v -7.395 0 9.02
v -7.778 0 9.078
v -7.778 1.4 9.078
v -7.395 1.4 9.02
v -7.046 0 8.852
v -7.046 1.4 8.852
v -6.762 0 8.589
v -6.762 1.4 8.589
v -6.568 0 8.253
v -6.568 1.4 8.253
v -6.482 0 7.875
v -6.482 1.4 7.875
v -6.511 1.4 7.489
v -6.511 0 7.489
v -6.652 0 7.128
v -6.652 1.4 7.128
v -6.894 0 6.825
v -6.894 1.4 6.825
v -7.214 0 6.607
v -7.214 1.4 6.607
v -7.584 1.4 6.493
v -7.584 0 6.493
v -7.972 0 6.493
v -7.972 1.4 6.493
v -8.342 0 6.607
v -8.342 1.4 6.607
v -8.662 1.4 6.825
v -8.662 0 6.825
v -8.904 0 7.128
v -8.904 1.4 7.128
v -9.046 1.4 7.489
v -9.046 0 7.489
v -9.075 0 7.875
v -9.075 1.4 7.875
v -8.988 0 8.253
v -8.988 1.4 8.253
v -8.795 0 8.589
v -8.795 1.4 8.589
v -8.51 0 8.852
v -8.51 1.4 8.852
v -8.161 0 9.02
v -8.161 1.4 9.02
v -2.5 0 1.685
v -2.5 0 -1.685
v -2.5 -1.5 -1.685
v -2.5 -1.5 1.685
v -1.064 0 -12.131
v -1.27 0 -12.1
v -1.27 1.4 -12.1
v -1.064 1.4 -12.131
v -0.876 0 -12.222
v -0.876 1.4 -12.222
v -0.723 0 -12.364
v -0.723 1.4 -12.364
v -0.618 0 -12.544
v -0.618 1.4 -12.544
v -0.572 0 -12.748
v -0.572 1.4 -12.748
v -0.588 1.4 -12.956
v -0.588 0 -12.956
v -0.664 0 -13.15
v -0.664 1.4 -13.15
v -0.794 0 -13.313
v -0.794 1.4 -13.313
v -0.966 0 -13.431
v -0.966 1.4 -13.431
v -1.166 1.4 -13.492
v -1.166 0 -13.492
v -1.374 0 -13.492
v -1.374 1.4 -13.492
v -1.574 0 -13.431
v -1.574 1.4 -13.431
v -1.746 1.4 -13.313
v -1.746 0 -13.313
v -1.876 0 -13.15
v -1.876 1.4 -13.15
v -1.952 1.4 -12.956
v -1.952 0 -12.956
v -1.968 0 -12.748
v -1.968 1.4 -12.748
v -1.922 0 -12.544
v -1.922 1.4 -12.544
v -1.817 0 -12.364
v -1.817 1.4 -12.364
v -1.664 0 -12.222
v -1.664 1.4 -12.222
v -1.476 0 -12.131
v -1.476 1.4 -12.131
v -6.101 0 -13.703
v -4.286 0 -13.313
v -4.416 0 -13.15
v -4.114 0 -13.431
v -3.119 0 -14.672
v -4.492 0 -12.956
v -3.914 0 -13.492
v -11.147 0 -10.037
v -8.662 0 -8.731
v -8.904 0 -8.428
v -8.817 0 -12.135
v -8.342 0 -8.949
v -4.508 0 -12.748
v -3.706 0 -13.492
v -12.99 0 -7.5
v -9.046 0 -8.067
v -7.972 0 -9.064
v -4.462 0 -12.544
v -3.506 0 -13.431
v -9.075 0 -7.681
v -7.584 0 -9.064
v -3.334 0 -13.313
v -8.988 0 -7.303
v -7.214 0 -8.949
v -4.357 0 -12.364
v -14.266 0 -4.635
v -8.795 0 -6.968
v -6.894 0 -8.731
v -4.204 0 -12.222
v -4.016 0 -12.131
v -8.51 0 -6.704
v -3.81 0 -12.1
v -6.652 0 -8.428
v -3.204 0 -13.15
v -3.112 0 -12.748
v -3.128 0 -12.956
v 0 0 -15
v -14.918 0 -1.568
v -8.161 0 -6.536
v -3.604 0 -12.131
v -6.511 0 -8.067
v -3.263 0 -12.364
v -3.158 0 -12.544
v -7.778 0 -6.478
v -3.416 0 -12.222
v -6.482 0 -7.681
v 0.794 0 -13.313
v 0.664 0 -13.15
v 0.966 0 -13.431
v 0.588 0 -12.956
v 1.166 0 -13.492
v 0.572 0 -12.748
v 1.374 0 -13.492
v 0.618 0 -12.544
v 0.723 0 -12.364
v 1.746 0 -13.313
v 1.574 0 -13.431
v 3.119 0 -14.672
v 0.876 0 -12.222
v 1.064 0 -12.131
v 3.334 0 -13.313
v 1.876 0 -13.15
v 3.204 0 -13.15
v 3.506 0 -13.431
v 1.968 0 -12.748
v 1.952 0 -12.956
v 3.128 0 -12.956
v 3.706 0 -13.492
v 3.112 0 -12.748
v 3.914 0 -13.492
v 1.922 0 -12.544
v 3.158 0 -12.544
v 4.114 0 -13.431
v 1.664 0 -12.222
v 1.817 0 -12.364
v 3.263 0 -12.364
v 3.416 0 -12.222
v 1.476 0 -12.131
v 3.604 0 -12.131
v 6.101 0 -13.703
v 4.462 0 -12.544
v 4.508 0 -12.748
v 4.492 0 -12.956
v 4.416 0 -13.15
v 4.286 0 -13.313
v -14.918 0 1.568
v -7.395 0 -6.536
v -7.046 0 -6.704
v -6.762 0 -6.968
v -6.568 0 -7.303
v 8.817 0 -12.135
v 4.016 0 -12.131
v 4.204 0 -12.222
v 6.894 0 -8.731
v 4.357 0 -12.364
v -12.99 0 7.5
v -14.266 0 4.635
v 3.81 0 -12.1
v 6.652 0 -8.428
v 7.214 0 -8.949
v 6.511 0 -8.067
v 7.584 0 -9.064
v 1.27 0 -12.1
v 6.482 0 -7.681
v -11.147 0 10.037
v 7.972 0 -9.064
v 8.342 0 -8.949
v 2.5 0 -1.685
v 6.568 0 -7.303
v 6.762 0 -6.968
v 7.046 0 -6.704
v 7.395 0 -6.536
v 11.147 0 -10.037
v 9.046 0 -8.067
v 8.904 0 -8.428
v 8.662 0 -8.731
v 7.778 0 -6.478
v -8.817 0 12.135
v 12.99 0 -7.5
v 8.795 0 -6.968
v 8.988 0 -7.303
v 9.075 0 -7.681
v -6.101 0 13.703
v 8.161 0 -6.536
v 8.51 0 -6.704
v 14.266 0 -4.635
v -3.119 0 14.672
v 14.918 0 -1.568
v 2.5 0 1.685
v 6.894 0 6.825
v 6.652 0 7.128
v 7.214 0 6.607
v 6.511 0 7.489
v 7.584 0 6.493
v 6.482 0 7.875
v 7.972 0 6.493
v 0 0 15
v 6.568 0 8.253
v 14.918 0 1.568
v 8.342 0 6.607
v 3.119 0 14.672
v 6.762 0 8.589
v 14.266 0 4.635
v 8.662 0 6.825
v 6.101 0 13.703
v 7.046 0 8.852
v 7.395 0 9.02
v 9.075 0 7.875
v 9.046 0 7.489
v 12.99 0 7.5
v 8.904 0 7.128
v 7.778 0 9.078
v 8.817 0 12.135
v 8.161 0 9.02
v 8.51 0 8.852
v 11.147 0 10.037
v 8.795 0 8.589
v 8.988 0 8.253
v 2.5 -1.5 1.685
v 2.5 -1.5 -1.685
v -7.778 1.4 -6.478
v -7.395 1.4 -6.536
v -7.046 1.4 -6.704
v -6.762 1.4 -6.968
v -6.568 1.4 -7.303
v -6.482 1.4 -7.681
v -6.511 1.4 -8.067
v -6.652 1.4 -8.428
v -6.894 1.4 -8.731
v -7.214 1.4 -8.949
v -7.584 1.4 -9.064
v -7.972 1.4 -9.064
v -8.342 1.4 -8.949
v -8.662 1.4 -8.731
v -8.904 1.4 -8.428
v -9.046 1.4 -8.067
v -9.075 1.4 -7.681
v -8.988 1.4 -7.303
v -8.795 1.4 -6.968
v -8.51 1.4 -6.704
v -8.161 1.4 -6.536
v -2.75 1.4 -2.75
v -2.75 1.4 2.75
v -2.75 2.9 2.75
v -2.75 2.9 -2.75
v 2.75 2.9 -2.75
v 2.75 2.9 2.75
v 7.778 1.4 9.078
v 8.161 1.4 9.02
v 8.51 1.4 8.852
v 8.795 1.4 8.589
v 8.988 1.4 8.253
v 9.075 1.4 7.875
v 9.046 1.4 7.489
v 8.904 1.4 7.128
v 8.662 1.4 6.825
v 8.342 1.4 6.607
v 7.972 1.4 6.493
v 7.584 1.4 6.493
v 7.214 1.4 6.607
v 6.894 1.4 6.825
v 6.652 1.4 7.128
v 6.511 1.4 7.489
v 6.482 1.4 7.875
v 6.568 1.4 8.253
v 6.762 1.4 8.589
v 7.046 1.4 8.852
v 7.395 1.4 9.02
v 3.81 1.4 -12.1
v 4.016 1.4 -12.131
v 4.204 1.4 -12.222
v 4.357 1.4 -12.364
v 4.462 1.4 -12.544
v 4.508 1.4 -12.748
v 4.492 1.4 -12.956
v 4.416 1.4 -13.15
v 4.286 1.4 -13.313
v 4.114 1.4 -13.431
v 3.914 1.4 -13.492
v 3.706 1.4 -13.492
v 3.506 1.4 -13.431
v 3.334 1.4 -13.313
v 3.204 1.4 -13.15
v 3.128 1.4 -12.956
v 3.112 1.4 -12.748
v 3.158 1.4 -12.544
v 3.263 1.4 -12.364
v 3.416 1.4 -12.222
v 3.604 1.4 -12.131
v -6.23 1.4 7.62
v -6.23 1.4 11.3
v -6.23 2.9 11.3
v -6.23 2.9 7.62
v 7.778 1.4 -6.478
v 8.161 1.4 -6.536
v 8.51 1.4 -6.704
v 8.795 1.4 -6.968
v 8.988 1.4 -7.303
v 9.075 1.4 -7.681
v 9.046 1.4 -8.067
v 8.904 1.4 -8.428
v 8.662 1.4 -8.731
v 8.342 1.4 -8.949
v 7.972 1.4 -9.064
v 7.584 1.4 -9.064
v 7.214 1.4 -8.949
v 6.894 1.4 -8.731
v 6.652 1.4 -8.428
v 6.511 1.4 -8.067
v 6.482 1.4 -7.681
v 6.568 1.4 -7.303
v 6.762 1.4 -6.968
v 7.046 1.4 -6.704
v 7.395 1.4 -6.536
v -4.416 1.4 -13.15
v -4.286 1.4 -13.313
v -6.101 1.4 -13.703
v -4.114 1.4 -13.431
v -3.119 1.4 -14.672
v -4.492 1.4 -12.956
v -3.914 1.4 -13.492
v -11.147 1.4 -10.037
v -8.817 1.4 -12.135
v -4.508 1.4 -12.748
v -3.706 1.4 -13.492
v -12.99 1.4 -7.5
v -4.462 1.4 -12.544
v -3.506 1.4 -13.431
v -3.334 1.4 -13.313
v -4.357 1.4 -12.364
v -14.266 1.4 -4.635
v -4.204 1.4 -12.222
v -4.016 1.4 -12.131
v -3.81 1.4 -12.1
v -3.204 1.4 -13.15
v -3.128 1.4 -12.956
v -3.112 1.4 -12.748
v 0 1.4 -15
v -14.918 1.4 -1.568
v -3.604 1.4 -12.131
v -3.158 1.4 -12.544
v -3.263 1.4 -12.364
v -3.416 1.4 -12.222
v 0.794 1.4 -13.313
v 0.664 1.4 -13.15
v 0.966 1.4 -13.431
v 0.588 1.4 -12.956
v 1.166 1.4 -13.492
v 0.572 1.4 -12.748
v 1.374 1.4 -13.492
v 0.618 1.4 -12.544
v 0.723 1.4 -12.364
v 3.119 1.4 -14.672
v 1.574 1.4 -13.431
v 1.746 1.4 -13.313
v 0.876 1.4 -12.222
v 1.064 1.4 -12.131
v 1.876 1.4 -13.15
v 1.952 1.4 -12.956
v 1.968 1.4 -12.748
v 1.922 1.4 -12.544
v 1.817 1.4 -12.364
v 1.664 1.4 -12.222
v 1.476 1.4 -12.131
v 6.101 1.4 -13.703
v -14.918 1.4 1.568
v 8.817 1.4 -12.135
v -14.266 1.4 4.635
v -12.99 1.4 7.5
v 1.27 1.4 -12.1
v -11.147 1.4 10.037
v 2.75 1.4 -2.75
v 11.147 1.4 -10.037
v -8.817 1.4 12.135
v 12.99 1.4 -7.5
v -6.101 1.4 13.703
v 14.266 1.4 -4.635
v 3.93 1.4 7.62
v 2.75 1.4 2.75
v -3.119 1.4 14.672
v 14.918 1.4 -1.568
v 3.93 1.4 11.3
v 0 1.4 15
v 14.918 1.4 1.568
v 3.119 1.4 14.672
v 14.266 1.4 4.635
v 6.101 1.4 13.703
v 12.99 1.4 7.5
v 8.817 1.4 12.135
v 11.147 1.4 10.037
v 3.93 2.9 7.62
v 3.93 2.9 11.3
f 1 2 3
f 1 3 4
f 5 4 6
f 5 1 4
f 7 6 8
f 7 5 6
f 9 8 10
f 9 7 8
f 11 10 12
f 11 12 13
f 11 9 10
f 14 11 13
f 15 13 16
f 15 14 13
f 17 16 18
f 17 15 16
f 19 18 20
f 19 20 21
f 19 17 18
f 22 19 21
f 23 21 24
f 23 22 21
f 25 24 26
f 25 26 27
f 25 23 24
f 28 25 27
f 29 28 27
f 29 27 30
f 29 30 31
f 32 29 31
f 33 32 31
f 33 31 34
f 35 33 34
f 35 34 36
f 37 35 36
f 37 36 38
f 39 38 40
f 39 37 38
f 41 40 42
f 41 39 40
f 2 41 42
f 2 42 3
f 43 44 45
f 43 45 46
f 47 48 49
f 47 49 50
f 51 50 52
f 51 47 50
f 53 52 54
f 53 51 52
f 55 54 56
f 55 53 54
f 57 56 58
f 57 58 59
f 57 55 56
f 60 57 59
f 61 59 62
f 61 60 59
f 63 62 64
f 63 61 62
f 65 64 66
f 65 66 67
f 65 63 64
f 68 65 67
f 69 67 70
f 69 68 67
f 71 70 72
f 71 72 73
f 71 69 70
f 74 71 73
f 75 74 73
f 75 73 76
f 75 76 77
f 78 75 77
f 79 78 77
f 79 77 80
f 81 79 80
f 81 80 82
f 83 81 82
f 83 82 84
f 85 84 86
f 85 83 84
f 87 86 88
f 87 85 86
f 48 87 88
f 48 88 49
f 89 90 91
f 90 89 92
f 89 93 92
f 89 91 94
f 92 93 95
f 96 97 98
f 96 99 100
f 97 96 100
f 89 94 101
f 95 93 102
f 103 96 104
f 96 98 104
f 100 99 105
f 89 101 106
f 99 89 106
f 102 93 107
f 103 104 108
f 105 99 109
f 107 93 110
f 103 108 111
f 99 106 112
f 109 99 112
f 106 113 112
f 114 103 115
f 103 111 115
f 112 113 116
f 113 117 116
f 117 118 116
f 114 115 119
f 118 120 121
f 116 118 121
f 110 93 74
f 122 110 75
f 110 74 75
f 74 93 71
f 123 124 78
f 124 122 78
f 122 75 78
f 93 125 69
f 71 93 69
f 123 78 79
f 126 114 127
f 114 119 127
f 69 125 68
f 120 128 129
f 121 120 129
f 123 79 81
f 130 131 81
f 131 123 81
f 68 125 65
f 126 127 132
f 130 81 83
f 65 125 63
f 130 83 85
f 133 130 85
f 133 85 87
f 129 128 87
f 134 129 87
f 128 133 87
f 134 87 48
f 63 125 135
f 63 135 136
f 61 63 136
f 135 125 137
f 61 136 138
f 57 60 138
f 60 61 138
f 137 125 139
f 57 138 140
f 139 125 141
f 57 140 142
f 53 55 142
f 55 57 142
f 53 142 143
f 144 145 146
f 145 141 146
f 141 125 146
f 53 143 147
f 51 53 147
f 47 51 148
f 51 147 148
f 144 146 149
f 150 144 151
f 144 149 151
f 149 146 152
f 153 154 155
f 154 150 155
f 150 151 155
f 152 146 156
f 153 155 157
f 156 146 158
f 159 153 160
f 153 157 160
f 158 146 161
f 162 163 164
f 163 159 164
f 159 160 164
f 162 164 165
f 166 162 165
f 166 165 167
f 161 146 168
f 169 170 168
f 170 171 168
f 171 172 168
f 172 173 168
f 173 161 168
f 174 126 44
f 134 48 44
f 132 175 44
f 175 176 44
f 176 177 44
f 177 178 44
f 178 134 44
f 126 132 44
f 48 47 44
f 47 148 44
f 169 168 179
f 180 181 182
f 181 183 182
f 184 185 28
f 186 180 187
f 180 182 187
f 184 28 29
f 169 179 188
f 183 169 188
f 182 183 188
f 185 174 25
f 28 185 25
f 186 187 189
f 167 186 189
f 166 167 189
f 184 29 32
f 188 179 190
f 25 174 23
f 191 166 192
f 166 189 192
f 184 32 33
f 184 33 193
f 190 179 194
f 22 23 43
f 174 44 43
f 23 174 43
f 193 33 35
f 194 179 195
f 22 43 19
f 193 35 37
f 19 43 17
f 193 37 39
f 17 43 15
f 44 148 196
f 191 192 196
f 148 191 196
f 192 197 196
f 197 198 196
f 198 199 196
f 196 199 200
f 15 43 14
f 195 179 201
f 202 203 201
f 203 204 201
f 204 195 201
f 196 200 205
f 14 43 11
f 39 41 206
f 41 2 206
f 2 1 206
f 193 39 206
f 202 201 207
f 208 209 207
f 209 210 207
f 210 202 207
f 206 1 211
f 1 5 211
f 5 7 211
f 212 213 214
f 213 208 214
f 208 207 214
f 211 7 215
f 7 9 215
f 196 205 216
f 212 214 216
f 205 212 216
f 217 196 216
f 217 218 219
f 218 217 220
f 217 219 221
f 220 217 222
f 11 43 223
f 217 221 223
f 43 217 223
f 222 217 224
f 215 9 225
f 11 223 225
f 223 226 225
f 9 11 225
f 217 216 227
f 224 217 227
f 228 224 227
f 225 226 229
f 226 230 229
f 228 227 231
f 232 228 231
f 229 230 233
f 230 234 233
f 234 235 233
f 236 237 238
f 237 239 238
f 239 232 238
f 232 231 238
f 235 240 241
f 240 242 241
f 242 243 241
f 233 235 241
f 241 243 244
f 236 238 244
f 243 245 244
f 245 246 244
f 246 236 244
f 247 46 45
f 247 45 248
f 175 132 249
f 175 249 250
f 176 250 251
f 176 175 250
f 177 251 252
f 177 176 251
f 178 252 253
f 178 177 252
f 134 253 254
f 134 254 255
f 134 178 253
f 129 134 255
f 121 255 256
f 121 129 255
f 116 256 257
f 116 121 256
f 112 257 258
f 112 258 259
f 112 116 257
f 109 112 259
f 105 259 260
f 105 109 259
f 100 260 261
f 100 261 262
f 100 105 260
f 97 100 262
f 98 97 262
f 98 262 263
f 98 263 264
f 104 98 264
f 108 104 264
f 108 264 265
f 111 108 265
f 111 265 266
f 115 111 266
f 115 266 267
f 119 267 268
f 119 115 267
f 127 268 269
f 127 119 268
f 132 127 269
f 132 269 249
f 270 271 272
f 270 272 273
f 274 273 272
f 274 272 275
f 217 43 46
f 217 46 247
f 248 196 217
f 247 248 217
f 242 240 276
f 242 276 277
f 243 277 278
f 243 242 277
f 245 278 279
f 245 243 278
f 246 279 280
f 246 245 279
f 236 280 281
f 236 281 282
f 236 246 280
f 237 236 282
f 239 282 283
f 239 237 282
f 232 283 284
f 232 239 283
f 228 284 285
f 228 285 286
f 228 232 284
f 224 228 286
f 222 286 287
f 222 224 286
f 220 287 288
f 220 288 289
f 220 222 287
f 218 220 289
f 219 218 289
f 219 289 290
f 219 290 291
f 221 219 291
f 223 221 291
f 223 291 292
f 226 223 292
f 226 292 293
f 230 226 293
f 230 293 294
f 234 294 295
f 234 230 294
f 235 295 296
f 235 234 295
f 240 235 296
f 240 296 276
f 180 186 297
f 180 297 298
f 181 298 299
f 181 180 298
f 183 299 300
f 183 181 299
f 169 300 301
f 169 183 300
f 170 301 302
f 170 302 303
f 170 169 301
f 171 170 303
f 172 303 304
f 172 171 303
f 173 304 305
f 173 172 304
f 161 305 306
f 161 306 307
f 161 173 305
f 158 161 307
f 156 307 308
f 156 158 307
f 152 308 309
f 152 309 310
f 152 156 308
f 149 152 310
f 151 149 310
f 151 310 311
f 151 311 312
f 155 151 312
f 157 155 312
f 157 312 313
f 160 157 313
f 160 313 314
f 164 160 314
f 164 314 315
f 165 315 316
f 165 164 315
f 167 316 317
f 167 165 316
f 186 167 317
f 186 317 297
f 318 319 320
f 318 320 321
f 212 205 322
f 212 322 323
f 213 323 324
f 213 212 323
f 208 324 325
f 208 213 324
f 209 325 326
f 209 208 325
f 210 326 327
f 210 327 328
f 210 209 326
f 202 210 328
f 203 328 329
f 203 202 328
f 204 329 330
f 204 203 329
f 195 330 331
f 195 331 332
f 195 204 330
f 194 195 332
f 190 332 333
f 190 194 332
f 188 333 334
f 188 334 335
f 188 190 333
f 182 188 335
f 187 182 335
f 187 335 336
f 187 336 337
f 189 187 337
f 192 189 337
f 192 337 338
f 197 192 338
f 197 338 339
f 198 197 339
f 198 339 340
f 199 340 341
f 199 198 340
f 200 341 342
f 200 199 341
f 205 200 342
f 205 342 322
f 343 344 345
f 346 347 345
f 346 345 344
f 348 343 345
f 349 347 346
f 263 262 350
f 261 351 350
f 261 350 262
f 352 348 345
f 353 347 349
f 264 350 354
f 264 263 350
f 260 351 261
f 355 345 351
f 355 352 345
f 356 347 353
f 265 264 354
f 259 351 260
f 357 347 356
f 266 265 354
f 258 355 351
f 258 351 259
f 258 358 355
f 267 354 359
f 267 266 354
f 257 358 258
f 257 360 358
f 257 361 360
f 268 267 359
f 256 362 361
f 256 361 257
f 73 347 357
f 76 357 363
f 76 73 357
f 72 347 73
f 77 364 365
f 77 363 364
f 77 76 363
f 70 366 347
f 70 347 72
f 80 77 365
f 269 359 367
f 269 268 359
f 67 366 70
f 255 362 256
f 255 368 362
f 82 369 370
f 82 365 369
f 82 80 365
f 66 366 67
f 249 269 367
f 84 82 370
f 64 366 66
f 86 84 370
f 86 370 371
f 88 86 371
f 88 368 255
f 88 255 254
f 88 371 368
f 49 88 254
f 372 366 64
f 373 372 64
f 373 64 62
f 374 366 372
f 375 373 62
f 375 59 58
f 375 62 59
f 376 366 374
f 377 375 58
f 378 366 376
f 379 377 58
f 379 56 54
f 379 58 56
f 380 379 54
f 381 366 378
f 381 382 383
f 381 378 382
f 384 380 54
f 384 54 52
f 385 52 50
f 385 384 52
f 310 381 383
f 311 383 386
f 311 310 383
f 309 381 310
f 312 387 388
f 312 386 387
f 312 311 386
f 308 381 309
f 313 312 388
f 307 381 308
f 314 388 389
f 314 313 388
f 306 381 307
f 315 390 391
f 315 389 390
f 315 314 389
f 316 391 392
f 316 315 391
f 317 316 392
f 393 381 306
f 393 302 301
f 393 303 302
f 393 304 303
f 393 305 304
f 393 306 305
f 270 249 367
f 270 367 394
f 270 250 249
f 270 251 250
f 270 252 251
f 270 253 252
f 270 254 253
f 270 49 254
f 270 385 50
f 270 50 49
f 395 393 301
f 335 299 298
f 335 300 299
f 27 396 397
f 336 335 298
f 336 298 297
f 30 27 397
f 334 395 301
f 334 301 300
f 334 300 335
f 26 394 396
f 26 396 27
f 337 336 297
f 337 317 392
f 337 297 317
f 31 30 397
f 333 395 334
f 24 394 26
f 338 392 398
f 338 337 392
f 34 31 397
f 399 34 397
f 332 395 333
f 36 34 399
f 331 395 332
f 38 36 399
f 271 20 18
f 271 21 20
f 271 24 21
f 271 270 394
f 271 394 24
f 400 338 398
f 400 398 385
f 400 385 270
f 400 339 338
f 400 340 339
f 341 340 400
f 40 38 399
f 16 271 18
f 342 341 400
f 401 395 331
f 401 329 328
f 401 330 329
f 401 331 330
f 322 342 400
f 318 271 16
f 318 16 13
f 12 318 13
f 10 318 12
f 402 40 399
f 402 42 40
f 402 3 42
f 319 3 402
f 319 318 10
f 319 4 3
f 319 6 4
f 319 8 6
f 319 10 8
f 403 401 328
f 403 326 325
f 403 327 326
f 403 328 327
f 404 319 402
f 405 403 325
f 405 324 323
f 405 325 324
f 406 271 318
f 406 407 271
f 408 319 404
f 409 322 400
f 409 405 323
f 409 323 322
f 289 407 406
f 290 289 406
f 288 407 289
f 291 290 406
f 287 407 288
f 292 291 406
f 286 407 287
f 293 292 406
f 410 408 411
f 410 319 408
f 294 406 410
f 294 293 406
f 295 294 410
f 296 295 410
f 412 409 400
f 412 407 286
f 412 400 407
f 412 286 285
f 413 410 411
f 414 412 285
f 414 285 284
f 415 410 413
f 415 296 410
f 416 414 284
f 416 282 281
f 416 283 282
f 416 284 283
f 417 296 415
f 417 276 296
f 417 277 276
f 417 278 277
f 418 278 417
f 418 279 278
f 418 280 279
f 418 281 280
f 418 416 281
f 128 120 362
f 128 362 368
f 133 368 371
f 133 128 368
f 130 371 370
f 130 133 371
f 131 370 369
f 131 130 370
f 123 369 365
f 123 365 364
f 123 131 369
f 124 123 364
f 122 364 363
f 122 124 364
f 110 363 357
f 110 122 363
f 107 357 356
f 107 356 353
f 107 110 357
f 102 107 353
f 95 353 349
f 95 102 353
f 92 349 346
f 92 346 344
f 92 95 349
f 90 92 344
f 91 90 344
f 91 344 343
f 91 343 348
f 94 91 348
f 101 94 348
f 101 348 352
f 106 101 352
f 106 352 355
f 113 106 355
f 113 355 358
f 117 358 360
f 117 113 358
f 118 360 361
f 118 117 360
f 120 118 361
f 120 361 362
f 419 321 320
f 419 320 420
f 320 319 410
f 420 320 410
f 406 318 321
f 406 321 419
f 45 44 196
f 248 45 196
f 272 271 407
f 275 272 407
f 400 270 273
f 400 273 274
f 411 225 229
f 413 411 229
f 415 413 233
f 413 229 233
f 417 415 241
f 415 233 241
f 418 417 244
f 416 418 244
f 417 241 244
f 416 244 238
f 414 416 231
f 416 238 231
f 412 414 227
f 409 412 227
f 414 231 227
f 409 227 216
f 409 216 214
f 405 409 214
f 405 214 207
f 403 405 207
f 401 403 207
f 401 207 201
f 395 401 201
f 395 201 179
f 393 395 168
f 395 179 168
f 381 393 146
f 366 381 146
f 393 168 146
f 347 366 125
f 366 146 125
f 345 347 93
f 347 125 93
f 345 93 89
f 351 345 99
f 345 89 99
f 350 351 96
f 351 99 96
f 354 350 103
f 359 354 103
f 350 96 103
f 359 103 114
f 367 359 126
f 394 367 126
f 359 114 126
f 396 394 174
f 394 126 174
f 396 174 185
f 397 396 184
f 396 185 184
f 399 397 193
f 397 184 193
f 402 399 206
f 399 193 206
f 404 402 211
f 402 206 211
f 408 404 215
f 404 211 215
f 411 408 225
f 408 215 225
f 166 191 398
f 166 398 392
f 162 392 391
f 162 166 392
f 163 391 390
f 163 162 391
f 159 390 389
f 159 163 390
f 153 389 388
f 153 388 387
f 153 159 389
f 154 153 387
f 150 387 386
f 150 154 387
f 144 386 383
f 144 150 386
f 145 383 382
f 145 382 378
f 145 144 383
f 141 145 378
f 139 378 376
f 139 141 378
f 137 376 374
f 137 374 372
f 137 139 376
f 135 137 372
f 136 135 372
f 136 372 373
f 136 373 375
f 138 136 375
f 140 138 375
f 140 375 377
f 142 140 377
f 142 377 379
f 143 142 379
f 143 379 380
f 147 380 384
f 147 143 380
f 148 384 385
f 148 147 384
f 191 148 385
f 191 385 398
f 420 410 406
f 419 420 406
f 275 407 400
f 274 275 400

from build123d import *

# Parameters (mm, degrees)
SKETCH_1_R      = 15
SKETCH_1_R_2    = 1.3
SKETCH_1_R_3    = 0.7
EXTRUDE_2_DEPTH = 1.4
SKETCH_2_W      = 5.5
SKETCH_2_H      = 5.5
SKETCH_2_W_2    = 10.16
SKETCH_2_H_2    = 3.68
EXTRUDE_5_DEPTH = 1.5
SKETCH_3_W      = 5
SKETCH_3_H      = 3.37
EXTRUDE_7_DEPTH = 1.5


with BuildPart() as part:
    # 草图1 → 凸台-拉伸2 (new body)
    with BuildSketch(Plane(origin=(0, 0, 0), x_dir=(1, 0, 0), z_dir=(0, 1, 0))):
        with Locations(Location((0, 0, 0), (0, 0, 270))):
            Circle(SKETCH_1_R)
        with Locations(Location((-7.778174593, 7.778174593, 0), (0, 0, 270))):
            Circle(SKETCH_1_R_2, mode=Mode.SUBTRACT)
        with Locations(Location((7.778174593, 7.778174593, 0), (0, 0, 270))):
            Circle(SKETCH_1_R_2, mode=Mode.SUBTRACT)
        with Locations(Location((7.778174593, -7.778174593, 0), (0, 0, 270))):
            Circle(SKETCH_1_R_2, mode=Mode.SUBTRACT)
        with Locations(Location((-7.778174593, -7.778174593, 0), (0, 0, 270))):
            Circle(SKETCH_1_R_2, mode=Mode.SUBTRACT)
        with Locations(Location((-3.81, 12.8, 0), (0, 0, 270))):
            Circle(SKETCH_1_R_3, mode=Mode.SUBTRACT)
        with Locations(Location((-1.27, 12.8, 0), (0, 0, 270))):
            Circle(SKETCH_1_R_3, mode=Mode.SUBTRACT)
        with Locations(Location((1.27, 12.8, 0), (0, 0, 270))):
            Circle(SKETCH_1_R_3, mode=Mode.SUBTRACT)
        with Locations(Location((3.81, 12.8, 0), (0, 0, 270))):
            Circle(SKETCH_1_R_3, mode=Mode.SUBTRACT)
    extrude(amount=EXTRUDE_2_DEPTH)

    # 草图2 → 凸台-拉伸5 (add)
    with BuildSketch(Plane(origin=(0, 1.4, 0), x_dir=(1, 0, 0), z_dir=(0, 1, 0))):
        Rectangle(SKETCH_2_W, SKETCH_2_H)
        with Locations((-1.15, -9.46)):
            Rectangle(SKETCH_2_W_2, SKETCH_2_H_2)
    extrude(amount=EXTRUDE_5_DEPTH)

    # 草图3 → 凸台-拉伸7 (add)
    with BuildSketch(Plane.XZ):
        Rectangle(SKETCH_3_W, SKETCH_3_H)
    extrude(amount=EXTRUDE_7_DEPTH)


solid = part.part
